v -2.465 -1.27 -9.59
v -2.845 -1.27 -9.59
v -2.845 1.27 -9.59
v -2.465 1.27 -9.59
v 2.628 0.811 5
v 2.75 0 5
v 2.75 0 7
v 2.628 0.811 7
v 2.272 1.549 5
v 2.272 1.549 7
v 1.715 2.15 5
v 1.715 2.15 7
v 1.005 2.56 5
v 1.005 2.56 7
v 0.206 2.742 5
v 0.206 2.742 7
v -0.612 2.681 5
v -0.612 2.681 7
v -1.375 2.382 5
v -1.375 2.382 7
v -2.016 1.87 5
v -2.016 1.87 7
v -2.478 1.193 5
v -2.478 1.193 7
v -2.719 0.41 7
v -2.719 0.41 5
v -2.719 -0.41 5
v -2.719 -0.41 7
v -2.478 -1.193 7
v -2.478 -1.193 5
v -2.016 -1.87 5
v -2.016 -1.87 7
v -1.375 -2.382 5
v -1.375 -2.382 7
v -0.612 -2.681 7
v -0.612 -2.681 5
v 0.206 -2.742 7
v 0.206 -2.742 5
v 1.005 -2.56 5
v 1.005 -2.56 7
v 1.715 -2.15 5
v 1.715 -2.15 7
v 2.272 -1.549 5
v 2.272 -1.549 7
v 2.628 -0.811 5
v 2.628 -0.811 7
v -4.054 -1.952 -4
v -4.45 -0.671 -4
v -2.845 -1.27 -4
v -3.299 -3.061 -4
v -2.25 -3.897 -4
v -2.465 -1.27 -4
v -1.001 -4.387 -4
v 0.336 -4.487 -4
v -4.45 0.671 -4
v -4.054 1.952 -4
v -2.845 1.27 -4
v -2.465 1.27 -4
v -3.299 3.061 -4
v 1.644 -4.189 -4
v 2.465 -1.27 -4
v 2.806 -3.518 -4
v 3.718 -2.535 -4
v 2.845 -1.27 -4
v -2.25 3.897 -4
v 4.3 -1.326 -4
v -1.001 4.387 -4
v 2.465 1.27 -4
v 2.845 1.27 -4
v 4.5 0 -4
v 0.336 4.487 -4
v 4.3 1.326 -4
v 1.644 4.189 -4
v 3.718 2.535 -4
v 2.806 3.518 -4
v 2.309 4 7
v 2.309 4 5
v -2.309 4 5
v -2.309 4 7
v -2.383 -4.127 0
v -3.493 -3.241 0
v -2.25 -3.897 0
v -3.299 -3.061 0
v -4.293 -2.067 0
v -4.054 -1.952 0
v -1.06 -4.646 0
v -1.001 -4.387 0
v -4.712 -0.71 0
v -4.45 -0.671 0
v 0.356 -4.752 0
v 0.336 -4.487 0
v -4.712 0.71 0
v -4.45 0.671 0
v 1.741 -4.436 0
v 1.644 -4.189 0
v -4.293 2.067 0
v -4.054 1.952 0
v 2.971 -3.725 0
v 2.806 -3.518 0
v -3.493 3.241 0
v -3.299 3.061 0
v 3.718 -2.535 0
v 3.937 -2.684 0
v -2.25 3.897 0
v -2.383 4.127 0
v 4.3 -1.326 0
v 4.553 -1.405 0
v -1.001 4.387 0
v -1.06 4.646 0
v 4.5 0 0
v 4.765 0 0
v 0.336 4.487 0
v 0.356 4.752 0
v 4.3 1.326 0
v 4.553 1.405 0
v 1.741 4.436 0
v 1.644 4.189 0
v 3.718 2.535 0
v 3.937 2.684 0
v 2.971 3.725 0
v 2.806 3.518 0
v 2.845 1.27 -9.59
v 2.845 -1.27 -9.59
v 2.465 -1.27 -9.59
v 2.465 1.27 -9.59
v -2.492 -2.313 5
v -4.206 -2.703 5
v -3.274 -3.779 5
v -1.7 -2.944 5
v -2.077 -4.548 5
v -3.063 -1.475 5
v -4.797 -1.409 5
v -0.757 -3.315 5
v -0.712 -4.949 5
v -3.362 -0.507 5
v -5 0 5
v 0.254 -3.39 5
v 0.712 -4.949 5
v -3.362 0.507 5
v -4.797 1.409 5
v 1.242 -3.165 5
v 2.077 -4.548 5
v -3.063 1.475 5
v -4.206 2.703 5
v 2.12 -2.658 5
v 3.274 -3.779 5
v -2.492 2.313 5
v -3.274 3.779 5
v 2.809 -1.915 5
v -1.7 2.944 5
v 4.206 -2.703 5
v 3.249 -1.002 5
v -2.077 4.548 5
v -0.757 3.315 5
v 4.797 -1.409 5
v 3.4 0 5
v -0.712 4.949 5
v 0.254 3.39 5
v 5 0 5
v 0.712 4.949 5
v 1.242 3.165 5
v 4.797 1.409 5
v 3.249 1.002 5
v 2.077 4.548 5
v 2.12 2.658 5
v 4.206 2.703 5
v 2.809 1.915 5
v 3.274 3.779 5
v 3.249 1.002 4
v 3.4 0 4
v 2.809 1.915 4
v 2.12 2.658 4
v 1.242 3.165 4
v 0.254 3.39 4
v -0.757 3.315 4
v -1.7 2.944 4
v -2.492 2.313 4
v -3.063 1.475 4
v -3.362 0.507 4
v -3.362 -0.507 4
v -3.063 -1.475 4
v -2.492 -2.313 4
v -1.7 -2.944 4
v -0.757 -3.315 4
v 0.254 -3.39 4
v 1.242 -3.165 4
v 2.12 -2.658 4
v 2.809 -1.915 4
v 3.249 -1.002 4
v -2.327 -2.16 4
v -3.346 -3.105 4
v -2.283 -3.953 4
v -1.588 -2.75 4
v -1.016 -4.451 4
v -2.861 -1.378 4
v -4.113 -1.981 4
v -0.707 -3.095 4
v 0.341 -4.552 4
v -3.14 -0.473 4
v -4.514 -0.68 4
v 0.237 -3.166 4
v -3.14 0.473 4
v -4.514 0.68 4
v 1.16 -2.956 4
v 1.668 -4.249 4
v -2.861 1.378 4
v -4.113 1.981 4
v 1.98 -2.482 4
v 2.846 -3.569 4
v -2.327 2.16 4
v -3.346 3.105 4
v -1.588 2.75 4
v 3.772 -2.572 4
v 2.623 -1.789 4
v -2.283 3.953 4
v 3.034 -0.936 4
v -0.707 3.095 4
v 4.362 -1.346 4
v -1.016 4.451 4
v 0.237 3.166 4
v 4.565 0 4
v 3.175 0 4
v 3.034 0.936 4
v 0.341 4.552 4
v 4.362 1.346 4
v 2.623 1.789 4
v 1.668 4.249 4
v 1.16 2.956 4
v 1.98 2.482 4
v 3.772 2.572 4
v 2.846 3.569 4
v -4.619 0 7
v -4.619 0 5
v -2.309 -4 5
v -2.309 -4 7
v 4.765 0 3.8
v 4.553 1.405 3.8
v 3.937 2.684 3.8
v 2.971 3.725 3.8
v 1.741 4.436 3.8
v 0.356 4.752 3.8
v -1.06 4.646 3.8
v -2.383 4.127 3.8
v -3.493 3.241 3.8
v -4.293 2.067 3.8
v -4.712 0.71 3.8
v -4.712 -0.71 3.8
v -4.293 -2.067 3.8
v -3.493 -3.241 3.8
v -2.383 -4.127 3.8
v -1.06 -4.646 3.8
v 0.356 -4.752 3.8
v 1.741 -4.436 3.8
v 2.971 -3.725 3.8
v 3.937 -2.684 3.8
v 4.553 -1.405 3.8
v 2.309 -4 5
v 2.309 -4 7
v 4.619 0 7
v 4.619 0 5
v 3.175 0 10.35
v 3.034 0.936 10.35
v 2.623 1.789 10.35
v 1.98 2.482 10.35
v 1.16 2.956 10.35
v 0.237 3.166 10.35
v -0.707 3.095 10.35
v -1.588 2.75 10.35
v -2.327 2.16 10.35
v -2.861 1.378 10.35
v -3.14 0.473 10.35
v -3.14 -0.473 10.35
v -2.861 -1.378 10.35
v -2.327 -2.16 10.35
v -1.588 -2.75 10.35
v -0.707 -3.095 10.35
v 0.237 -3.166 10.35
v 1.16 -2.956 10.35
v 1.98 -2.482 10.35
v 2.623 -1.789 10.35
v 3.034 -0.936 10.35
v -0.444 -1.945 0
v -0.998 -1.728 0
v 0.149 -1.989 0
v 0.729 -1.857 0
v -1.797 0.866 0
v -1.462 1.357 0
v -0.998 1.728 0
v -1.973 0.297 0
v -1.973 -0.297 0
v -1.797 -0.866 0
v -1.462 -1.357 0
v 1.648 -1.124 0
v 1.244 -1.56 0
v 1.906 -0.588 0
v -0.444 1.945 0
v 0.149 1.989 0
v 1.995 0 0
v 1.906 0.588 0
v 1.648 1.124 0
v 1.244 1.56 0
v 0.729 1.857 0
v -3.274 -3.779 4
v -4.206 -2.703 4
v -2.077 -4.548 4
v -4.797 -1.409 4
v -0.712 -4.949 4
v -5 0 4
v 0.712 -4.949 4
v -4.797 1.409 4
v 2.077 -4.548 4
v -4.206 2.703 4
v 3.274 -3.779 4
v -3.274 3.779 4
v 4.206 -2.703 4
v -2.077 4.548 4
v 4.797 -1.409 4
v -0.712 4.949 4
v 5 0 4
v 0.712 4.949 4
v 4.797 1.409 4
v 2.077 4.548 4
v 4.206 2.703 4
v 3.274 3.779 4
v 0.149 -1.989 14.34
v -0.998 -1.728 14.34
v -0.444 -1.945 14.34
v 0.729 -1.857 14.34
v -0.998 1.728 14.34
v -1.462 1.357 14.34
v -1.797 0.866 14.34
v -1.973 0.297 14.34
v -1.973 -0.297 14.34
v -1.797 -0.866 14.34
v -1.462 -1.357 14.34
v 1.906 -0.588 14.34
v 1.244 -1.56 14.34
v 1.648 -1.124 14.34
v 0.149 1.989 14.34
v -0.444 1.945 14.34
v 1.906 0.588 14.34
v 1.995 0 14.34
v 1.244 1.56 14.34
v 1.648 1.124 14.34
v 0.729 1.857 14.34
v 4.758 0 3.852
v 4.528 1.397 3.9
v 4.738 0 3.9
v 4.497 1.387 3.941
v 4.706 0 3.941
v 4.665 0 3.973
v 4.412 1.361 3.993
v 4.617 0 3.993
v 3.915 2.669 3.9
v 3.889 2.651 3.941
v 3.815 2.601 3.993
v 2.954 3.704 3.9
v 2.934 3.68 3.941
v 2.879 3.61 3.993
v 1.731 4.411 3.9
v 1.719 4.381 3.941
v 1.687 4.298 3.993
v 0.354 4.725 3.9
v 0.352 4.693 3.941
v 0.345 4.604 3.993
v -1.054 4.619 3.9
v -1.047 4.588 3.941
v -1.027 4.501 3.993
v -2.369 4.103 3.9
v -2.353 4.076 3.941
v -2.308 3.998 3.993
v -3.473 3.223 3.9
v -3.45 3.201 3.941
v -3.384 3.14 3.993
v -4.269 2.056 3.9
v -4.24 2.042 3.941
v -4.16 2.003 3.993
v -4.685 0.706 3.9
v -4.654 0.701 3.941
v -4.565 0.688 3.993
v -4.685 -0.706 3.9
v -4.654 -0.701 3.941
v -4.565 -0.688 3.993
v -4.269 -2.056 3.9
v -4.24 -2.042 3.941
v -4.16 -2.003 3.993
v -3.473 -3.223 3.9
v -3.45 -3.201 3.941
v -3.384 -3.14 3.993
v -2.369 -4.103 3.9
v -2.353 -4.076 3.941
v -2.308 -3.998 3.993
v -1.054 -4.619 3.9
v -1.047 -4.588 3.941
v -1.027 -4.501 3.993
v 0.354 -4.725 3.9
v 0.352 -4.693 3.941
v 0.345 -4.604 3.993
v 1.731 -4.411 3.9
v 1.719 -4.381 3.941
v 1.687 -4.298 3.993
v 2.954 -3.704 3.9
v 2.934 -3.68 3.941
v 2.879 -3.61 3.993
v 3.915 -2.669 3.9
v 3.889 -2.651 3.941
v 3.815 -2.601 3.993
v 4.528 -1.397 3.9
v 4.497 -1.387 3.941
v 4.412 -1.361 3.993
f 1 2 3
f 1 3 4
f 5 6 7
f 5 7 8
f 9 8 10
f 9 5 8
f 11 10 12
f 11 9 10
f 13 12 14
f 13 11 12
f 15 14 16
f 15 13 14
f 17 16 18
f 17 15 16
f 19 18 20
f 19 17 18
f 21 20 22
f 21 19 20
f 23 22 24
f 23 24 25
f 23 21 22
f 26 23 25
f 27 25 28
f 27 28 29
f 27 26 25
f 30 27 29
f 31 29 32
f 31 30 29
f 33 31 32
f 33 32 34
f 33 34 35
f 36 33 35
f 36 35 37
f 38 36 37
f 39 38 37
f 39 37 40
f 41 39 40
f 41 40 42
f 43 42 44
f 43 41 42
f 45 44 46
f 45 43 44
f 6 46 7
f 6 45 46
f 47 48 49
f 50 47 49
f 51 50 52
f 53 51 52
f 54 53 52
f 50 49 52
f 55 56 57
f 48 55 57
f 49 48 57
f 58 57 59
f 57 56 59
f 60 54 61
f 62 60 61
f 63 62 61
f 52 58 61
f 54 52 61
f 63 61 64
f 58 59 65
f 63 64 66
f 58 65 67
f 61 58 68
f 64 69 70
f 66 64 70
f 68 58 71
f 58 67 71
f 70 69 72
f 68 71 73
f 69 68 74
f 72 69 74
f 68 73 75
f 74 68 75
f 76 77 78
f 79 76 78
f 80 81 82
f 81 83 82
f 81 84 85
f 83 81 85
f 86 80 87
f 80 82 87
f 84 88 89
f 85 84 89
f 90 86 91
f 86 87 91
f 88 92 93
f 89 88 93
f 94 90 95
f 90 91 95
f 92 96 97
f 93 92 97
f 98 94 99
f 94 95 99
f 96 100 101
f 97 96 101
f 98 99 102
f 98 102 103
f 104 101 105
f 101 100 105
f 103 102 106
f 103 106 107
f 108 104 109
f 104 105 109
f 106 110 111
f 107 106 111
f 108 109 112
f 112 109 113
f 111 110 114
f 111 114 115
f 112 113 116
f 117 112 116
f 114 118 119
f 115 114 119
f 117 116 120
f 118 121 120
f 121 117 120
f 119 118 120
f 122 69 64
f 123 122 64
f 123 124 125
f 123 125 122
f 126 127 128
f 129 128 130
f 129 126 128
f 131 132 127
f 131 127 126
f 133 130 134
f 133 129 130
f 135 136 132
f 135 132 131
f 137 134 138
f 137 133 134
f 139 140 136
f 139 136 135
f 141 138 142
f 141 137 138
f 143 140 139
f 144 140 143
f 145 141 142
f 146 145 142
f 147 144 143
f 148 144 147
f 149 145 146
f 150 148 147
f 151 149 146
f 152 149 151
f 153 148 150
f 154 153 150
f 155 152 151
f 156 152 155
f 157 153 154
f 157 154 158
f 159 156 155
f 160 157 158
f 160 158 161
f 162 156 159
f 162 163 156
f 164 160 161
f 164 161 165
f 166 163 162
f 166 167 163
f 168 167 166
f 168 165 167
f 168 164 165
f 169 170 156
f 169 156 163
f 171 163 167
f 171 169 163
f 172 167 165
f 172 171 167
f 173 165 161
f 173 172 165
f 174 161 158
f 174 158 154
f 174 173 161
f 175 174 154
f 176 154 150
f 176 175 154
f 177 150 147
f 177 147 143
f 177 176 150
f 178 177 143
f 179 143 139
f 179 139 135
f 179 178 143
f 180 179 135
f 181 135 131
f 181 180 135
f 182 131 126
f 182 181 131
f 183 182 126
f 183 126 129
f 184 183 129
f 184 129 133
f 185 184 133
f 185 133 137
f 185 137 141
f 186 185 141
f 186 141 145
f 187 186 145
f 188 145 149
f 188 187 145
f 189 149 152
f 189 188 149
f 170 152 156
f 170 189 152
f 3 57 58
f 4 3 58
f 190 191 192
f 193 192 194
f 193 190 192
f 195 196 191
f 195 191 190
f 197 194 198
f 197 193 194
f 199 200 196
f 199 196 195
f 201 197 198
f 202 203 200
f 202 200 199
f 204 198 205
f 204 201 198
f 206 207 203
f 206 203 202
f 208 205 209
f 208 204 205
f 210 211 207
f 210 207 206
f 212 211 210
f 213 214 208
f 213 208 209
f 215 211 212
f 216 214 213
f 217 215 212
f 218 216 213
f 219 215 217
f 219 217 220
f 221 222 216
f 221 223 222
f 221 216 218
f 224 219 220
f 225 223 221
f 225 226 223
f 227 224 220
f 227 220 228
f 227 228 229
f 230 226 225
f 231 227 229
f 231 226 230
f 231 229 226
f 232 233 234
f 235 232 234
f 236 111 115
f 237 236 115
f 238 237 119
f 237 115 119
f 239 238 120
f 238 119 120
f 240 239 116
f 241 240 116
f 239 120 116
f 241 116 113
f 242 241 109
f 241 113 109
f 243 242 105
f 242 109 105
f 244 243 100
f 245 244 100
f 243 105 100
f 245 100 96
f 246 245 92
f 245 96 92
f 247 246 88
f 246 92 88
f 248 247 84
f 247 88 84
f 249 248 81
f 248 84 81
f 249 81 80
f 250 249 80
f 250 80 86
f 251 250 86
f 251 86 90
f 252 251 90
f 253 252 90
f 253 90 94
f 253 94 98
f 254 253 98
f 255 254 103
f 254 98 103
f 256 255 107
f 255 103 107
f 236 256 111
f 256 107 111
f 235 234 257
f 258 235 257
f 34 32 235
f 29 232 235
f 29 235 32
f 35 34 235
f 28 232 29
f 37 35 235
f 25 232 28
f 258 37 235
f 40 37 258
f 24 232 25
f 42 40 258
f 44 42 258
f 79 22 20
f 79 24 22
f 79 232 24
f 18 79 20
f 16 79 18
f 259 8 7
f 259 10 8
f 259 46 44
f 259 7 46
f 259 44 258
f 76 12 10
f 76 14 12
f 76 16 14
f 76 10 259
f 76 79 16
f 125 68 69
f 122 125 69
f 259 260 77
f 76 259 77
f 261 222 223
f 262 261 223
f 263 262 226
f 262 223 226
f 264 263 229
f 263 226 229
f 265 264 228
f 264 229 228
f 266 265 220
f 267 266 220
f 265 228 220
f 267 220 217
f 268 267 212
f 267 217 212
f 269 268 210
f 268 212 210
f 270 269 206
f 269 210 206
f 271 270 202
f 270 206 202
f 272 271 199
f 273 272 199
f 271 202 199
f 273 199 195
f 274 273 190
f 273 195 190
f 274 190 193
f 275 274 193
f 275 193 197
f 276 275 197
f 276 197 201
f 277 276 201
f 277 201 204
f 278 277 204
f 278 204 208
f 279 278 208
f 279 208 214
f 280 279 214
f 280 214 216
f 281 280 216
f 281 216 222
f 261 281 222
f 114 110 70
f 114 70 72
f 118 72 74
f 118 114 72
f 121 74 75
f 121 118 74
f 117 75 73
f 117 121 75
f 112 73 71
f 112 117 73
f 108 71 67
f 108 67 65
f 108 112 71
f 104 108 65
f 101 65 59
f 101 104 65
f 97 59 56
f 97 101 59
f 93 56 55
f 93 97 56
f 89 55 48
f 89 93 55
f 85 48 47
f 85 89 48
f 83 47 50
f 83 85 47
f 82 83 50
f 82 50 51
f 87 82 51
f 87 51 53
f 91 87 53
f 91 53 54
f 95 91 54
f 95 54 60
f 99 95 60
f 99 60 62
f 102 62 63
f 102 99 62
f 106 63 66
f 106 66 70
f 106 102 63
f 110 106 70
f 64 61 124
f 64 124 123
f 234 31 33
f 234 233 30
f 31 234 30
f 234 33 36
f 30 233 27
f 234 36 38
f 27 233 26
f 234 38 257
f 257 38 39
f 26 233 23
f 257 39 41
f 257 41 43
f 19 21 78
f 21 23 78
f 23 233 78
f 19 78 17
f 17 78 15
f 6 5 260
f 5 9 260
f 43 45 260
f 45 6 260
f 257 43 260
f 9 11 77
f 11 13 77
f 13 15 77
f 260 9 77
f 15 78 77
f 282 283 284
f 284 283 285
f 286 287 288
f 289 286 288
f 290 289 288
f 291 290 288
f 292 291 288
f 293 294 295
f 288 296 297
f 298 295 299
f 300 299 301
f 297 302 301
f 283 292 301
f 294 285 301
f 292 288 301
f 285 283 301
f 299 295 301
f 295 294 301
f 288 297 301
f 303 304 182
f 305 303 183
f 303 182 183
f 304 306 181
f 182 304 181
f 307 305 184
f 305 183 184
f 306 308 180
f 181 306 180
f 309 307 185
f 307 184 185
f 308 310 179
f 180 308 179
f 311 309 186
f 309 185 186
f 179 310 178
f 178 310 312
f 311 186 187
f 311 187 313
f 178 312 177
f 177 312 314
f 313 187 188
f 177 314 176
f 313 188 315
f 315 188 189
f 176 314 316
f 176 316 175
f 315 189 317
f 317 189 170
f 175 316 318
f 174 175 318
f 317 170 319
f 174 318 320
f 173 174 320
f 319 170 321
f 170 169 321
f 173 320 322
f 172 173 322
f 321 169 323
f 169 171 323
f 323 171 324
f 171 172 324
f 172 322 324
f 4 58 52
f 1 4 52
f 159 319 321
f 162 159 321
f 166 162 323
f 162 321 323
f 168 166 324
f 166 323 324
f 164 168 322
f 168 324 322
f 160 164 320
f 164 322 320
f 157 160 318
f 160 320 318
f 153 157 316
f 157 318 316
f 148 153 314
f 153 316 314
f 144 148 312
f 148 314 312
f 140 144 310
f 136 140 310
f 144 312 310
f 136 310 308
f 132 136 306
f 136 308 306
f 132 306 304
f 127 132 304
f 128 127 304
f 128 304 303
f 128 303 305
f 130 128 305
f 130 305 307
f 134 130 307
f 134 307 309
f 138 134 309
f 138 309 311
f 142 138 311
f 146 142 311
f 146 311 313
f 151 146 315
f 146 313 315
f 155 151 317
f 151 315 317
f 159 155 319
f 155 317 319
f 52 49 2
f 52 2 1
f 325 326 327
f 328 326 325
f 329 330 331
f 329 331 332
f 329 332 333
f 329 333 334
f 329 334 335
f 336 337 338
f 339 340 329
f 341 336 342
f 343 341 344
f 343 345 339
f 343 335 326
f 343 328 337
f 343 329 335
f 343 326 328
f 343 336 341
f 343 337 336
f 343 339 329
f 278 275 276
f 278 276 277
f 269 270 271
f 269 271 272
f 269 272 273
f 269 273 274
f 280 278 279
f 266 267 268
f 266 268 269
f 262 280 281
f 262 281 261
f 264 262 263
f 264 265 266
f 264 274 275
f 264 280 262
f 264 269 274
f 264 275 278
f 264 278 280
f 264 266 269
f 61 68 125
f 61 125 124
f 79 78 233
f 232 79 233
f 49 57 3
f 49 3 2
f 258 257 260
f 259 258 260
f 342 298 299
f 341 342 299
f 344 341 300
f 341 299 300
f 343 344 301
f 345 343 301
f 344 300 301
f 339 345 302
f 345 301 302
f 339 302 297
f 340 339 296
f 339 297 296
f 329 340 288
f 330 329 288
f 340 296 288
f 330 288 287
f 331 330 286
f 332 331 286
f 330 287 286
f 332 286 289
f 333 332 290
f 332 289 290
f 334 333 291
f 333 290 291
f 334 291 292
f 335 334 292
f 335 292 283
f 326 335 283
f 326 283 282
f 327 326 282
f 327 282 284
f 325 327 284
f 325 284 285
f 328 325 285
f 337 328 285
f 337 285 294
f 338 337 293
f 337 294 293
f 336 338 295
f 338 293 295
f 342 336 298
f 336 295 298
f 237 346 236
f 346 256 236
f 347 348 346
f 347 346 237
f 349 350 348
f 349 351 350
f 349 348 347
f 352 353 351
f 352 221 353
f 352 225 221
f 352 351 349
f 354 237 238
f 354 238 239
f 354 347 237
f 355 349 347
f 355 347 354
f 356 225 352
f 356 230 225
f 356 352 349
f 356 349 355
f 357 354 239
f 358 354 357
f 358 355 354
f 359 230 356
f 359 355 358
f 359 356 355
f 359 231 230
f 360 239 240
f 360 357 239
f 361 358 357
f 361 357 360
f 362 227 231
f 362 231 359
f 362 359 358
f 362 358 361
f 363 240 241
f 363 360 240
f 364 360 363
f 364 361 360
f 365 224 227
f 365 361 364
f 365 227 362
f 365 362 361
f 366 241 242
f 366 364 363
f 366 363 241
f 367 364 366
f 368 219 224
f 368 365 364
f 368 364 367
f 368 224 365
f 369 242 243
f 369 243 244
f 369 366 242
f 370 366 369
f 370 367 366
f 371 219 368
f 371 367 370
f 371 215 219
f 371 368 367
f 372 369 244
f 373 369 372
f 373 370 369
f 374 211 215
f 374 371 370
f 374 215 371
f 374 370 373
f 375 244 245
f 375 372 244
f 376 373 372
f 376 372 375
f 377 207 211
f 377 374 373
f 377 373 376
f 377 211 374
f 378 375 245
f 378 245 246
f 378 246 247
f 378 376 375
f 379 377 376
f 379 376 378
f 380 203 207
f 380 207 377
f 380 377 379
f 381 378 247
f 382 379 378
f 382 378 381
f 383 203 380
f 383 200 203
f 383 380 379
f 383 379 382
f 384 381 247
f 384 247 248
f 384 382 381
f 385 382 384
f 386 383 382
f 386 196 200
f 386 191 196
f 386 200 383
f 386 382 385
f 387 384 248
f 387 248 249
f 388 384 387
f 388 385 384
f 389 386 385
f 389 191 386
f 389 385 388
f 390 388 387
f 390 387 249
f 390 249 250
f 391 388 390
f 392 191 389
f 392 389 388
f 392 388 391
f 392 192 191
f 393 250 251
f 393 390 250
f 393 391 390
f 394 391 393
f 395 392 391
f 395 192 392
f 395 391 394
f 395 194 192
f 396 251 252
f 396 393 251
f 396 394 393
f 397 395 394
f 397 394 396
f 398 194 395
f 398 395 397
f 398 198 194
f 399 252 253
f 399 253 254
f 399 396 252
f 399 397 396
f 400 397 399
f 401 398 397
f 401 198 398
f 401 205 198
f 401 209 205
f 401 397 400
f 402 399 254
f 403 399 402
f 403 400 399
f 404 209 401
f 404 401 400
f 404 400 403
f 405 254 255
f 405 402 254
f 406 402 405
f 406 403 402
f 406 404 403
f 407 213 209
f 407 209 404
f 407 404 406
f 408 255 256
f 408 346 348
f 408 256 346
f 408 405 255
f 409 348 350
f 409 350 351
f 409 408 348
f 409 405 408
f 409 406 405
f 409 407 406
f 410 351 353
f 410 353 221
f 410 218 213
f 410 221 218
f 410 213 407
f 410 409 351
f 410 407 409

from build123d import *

# Parameters (mm, degrees)
F0_R      = 1.995
F1_DEPTH  = 14.34
F0_R_2    = 3.175
F2_DEPTH  = 10.35
F0_R_3    = 4.765
F0_R_4    = 4.5
F3_DEPTH  = 4
F4_DEPTH  = 4
F5_W      = 0.38
F5_H      = 2.54
F6_DEPTH  = 5.59
F7_R      = 0.2
F8_R      = 5
F8_R_2    = 3.4
F9_DEPTH  = 1
F10_R     = 2.75
F11_DEPTH = 2


with BuildPart() as f1:
    # F0 (on Top) → F1 (new body)
    with BuildSketch(Plane.XY):
        Circle(F0_R)
    extrude(amount=F1_DEPTH)


with BuildPart() as f2:
    # F0 (on Top) → F2 (new body)
    with BuildSketch(Plane.XY):
        Circle(F0_R_2)
        Circle(F0_R, mode=Mode.SUBTRACT)
        Circle(F0_R)
    extrude(amount=F2_DEPTH)

    # F0 (on Top) → F3 (join)
    with BuildSketch(Plane.XY):
        Circle(F0_R_3)
        Circle(F0_R_4, mode=Mode.SUBTRACT)
        Circle(F0_R_4)
        Circle(F0_R_2, mode=Mode.SUBTRACT)
        Circle(F0_R_2)
        Circle(F0_R, mode=Mode.SUBTRACT)
        Circle(F0_R)
    extrude(amount=F3_DEPTH)

    # F0 (on Top) → F4 (join)
    with BuildSketch(Plane.XY):
        Circle(F0_R_4)
        Circle(F0_R_2, mode=Mode.SUBTRACT)
        Circle(F0_R_2)
        Circle(F0_R, mode=Mode.SUBTRACT)
        Circle(F0_R)
    extrude(amount=-F4_DEPTH)

    # F5 (on face) → F6 (join)
    with BuildSketch(Plane(origin=(0, 0, -4), x_dir=(1, 0, 0), z_dir=(0, 0, -1))):
        with Locations((-2.655, 0)):
            Rectangle(F5_W, F5_H)
        with Locations((2.655, 0)):
            Rectangle(F5_W, F5_H)
    extrude(amount=F6_DEPTH)

    # F7
    f7_edges = [f2.edges().sort_by_distance(p)[0] for p in [
        (-4.765, 0, 4),
    ]]
    fillet(f7_edges, radius=F7_R)


with BuildPart() as f9:
    # F8 (on face) → F9 (new body)
    with BuildSketch(Plane.XY.offset(4)):
        Circle(F8_R)
        Circle(F8_R_2, mode=Mode.SUBTRACT)
    extrude(amount=F9_DEPTH)


with BuildPart() as f11:
    # F10 (on face) → F11 (new body)
    with BuildSketch(Plane.XY.offset(5)):
        Polygon((2.3094010768, 4), (-2.3094010768, 4), (-4.6188021535, 0), (-2.3094010768, -4), (2.3094010768, -4), (4.6188021535, 0), align=None)
        Circle(F10_R, mode=Mode.SUBTRACT)
    extrude(amount=F11_DEPTH)


solid = Compound([f1.part, f2.part, f9.part, f11.part])
